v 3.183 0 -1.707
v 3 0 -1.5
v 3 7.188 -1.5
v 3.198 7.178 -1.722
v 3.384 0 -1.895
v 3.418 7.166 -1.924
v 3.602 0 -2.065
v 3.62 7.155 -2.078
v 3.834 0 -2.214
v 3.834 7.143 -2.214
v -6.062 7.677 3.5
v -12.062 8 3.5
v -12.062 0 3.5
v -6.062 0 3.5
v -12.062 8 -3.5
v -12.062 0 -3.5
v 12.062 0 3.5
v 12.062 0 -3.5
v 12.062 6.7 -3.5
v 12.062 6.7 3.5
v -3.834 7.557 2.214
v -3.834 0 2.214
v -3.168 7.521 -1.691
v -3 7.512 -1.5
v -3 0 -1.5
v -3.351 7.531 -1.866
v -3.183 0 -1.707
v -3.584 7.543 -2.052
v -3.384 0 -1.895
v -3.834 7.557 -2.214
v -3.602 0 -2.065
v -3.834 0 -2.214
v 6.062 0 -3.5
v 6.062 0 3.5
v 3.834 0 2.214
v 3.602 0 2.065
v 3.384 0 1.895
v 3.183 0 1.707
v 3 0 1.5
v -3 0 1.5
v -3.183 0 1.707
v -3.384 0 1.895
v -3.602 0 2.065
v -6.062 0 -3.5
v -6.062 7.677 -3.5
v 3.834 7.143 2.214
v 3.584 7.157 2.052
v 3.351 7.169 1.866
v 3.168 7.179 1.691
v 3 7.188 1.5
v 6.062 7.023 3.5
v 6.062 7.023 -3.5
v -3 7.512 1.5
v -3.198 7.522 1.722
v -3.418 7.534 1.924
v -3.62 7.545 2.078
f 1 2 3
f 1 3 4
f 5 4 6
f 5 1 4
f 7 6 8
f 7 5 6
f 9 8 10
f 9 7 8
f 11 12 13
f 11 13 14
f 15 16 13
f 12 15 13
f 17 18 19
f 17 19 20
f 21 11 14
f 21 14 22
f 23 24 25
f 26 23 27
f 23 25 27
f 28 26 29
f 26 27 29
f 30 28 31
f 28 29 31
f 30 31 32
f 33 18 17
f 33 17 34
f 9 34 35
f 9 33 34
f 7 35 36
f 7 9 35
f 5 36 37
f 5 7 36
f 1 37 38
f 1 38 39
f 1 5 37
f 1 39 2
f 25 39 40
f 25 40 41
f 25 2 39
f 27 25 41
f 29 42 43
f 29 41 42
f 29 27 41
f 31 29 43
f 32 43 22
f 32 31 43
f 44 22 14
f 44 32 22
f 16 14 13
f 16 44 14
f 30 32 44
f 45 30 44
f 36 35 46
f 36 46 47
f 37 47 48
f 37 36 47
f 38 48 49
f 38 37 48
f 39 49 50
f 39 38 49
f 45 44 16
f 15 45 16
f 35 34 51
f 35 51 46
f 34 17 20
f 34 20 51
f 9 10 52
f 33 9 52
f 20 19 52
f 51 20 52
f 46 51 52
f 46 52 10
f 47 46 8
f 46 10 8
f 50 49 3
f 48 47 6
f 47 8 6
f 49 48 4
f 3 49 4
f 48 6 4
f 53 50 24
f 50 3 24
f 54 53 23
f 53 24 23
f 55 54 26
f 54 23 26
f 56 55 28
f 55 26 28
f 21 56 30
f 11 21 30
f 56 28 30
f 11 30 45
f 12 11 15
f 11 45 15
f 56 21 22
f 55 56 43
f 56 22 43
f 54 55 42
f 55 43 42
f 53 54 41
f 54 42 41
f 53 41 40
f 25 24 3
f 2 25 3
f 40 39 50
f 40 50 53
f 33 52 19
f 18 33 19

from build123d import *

# Parameters (mm, degrees)
BOSS_EXTRUDE1_DEPTH     = 8
BOSS_EXTRUDE1_2_DEPTH   = 8
BOSS_EXTRUDE2_DEPTH     = 8
CUT_EXTRUDE2_DEPTH      = 15.891142801
CUT_EXTRUDE2_DEPTH_BACK = 15.891142801


with BuildPart() as part:
    # Sketch2 → Boss-Extrude1 (new body)
    with BuildSketch(Plane(origin=(0, 0, 0), x_dir=(1, 0, 0), z_dir=(0, 1, 0))):
        with BuildLine():
            Line((-6.062177826, 3.5), (-12.062177826, 3.5))
            Line((-12.062177826, 3.5), (-12.062177826, -3.5))
            Line((-12.062177826, -3.5), (-6.062177826, -3.5))
            Line((-6.062177826, -3.5), (-3.834419723, -2.213803259))
            ThreePointArc((-3.834419723, -2.213803259), (-3.384272952, -1.895404124), (-3, -1.5))
            Line((-3, -1.5), (-3, 1.5))
            ThreePointArc((-3, 1.5), (-3.384272952, 1.895404124), (-3.834419723, 2.213803259))
            Line((-3.834419723, 2.213803259), (-6.062177826, 3.5))
        make_face()
    extrude(amount=BOSS_EXTRUDE1_DEPTH)



with BuildPart() as body_2:
    # Sketch2 → Boss-Extrude1 2 (new body)
    with BuildSketch(Plane(origin=(0, 0, 0), x_dir=(1, 0, 0), z_dir=(0, 1, 0))):
        with BuildLine():
            Line((3.834419723, 2.213803259), (6.062177826, 3.5))
            Line((6.062177826, 3.5), (12.062177826, 3.5))
            Line((12.062177826, 3.5), (12.062177826, -3.5))
            Line((12.062177826, -3.5), (6.062177826, -3.5))
            Line((6.062177826, -3.5), (3.834419723, -2.213803259))
            ThreePointArc((3.834419723, -2.213803259), (3.384272952, -1.895404124), (3, -1.5))
            Line((3, -1.5), (3, 1.5))
            ThreePointArc((3, 1.5), (3.384272952, 1.895404124), (3.834419723, 2.213803259))
        make_face()
    extrude(amount=BOSS_EXTRUDE1_2_DEPTH)


with BuildPart() as part_1:
    add(part.part)

    add(body_2.part)  # Boss-Extrude2 merges body 2
    # Sketch1 → Boss-Extrude2 (add)
    with BuildSketch(Plane(origin=(0, 0, 0), x_dir=(1, 0, 0), z_dir=(0, 1, 0))):
        with BuildLine():
            Line((3, -1.5), (-3, -1.5))
            ThreePointArc((-3, -1.5), (-3.898777162, -2.249912014), (-5.016117889, -2.598793246))
            ThreePointArc((-5.016117889, -2.598793246), (-5.630991226, -2.399814505), (-5.894085249, -1.809523648))
            Line((-5.894085249, -1.809523648), (-5.894085249, 1.809523648))
            ThreePointArc((-5.894085249, 1.809523648), (-5.630991226, 2.399814505), (-5.016117889, 2.598793246))
            ThreePointArc((-5.016117889, 2.598793246), (-3.898777162, 2.249912014), (-3, 1.5))
            Line((-3, 1.5), (3, 1.5))
            ThreePointArc((3, 1.5), (3.898777162, 2.249912014), (5.016117889, 2.598793246))
            ThreePointArc((5.016117889, 2.598793246), (5.630991226, 2.399814505), (5.894085249, 1.809523648))
            Line((5.894085249, 1.809523648), (5.894085249, -1.809523648))
            ThreePointArc((5.894085249, -1.809523648), (5.630991226, -2.399814505), (5.016117889, -2.598793246))
            ThreePointArc((5.016117889, -2.598793246), (3.898777162, -2.249912014), (3, -1.5))
        make_face()
    extrude(amount=BOSS_EXTRUDE2_DEPTH)

    # Sketch4 → Cut-Extrude2 (cut, two sides: drawn at the far end of the back side and taken through both)
    with BuildSketch(Plane.XY.offset(-CUT_EXTRUDE2_DEPTH_BACK)):
        Polygon((12.062177826, 8), (12.062177826, 6.7), (-12.062177826, 8), align=None)
    extrude(amount=CUT_EXTRUDE2_DEPTH + CUT_EXTRUDE2_DEPTH_BACK, mode=Mode.SUBTRACT)


solid = part_1.part
